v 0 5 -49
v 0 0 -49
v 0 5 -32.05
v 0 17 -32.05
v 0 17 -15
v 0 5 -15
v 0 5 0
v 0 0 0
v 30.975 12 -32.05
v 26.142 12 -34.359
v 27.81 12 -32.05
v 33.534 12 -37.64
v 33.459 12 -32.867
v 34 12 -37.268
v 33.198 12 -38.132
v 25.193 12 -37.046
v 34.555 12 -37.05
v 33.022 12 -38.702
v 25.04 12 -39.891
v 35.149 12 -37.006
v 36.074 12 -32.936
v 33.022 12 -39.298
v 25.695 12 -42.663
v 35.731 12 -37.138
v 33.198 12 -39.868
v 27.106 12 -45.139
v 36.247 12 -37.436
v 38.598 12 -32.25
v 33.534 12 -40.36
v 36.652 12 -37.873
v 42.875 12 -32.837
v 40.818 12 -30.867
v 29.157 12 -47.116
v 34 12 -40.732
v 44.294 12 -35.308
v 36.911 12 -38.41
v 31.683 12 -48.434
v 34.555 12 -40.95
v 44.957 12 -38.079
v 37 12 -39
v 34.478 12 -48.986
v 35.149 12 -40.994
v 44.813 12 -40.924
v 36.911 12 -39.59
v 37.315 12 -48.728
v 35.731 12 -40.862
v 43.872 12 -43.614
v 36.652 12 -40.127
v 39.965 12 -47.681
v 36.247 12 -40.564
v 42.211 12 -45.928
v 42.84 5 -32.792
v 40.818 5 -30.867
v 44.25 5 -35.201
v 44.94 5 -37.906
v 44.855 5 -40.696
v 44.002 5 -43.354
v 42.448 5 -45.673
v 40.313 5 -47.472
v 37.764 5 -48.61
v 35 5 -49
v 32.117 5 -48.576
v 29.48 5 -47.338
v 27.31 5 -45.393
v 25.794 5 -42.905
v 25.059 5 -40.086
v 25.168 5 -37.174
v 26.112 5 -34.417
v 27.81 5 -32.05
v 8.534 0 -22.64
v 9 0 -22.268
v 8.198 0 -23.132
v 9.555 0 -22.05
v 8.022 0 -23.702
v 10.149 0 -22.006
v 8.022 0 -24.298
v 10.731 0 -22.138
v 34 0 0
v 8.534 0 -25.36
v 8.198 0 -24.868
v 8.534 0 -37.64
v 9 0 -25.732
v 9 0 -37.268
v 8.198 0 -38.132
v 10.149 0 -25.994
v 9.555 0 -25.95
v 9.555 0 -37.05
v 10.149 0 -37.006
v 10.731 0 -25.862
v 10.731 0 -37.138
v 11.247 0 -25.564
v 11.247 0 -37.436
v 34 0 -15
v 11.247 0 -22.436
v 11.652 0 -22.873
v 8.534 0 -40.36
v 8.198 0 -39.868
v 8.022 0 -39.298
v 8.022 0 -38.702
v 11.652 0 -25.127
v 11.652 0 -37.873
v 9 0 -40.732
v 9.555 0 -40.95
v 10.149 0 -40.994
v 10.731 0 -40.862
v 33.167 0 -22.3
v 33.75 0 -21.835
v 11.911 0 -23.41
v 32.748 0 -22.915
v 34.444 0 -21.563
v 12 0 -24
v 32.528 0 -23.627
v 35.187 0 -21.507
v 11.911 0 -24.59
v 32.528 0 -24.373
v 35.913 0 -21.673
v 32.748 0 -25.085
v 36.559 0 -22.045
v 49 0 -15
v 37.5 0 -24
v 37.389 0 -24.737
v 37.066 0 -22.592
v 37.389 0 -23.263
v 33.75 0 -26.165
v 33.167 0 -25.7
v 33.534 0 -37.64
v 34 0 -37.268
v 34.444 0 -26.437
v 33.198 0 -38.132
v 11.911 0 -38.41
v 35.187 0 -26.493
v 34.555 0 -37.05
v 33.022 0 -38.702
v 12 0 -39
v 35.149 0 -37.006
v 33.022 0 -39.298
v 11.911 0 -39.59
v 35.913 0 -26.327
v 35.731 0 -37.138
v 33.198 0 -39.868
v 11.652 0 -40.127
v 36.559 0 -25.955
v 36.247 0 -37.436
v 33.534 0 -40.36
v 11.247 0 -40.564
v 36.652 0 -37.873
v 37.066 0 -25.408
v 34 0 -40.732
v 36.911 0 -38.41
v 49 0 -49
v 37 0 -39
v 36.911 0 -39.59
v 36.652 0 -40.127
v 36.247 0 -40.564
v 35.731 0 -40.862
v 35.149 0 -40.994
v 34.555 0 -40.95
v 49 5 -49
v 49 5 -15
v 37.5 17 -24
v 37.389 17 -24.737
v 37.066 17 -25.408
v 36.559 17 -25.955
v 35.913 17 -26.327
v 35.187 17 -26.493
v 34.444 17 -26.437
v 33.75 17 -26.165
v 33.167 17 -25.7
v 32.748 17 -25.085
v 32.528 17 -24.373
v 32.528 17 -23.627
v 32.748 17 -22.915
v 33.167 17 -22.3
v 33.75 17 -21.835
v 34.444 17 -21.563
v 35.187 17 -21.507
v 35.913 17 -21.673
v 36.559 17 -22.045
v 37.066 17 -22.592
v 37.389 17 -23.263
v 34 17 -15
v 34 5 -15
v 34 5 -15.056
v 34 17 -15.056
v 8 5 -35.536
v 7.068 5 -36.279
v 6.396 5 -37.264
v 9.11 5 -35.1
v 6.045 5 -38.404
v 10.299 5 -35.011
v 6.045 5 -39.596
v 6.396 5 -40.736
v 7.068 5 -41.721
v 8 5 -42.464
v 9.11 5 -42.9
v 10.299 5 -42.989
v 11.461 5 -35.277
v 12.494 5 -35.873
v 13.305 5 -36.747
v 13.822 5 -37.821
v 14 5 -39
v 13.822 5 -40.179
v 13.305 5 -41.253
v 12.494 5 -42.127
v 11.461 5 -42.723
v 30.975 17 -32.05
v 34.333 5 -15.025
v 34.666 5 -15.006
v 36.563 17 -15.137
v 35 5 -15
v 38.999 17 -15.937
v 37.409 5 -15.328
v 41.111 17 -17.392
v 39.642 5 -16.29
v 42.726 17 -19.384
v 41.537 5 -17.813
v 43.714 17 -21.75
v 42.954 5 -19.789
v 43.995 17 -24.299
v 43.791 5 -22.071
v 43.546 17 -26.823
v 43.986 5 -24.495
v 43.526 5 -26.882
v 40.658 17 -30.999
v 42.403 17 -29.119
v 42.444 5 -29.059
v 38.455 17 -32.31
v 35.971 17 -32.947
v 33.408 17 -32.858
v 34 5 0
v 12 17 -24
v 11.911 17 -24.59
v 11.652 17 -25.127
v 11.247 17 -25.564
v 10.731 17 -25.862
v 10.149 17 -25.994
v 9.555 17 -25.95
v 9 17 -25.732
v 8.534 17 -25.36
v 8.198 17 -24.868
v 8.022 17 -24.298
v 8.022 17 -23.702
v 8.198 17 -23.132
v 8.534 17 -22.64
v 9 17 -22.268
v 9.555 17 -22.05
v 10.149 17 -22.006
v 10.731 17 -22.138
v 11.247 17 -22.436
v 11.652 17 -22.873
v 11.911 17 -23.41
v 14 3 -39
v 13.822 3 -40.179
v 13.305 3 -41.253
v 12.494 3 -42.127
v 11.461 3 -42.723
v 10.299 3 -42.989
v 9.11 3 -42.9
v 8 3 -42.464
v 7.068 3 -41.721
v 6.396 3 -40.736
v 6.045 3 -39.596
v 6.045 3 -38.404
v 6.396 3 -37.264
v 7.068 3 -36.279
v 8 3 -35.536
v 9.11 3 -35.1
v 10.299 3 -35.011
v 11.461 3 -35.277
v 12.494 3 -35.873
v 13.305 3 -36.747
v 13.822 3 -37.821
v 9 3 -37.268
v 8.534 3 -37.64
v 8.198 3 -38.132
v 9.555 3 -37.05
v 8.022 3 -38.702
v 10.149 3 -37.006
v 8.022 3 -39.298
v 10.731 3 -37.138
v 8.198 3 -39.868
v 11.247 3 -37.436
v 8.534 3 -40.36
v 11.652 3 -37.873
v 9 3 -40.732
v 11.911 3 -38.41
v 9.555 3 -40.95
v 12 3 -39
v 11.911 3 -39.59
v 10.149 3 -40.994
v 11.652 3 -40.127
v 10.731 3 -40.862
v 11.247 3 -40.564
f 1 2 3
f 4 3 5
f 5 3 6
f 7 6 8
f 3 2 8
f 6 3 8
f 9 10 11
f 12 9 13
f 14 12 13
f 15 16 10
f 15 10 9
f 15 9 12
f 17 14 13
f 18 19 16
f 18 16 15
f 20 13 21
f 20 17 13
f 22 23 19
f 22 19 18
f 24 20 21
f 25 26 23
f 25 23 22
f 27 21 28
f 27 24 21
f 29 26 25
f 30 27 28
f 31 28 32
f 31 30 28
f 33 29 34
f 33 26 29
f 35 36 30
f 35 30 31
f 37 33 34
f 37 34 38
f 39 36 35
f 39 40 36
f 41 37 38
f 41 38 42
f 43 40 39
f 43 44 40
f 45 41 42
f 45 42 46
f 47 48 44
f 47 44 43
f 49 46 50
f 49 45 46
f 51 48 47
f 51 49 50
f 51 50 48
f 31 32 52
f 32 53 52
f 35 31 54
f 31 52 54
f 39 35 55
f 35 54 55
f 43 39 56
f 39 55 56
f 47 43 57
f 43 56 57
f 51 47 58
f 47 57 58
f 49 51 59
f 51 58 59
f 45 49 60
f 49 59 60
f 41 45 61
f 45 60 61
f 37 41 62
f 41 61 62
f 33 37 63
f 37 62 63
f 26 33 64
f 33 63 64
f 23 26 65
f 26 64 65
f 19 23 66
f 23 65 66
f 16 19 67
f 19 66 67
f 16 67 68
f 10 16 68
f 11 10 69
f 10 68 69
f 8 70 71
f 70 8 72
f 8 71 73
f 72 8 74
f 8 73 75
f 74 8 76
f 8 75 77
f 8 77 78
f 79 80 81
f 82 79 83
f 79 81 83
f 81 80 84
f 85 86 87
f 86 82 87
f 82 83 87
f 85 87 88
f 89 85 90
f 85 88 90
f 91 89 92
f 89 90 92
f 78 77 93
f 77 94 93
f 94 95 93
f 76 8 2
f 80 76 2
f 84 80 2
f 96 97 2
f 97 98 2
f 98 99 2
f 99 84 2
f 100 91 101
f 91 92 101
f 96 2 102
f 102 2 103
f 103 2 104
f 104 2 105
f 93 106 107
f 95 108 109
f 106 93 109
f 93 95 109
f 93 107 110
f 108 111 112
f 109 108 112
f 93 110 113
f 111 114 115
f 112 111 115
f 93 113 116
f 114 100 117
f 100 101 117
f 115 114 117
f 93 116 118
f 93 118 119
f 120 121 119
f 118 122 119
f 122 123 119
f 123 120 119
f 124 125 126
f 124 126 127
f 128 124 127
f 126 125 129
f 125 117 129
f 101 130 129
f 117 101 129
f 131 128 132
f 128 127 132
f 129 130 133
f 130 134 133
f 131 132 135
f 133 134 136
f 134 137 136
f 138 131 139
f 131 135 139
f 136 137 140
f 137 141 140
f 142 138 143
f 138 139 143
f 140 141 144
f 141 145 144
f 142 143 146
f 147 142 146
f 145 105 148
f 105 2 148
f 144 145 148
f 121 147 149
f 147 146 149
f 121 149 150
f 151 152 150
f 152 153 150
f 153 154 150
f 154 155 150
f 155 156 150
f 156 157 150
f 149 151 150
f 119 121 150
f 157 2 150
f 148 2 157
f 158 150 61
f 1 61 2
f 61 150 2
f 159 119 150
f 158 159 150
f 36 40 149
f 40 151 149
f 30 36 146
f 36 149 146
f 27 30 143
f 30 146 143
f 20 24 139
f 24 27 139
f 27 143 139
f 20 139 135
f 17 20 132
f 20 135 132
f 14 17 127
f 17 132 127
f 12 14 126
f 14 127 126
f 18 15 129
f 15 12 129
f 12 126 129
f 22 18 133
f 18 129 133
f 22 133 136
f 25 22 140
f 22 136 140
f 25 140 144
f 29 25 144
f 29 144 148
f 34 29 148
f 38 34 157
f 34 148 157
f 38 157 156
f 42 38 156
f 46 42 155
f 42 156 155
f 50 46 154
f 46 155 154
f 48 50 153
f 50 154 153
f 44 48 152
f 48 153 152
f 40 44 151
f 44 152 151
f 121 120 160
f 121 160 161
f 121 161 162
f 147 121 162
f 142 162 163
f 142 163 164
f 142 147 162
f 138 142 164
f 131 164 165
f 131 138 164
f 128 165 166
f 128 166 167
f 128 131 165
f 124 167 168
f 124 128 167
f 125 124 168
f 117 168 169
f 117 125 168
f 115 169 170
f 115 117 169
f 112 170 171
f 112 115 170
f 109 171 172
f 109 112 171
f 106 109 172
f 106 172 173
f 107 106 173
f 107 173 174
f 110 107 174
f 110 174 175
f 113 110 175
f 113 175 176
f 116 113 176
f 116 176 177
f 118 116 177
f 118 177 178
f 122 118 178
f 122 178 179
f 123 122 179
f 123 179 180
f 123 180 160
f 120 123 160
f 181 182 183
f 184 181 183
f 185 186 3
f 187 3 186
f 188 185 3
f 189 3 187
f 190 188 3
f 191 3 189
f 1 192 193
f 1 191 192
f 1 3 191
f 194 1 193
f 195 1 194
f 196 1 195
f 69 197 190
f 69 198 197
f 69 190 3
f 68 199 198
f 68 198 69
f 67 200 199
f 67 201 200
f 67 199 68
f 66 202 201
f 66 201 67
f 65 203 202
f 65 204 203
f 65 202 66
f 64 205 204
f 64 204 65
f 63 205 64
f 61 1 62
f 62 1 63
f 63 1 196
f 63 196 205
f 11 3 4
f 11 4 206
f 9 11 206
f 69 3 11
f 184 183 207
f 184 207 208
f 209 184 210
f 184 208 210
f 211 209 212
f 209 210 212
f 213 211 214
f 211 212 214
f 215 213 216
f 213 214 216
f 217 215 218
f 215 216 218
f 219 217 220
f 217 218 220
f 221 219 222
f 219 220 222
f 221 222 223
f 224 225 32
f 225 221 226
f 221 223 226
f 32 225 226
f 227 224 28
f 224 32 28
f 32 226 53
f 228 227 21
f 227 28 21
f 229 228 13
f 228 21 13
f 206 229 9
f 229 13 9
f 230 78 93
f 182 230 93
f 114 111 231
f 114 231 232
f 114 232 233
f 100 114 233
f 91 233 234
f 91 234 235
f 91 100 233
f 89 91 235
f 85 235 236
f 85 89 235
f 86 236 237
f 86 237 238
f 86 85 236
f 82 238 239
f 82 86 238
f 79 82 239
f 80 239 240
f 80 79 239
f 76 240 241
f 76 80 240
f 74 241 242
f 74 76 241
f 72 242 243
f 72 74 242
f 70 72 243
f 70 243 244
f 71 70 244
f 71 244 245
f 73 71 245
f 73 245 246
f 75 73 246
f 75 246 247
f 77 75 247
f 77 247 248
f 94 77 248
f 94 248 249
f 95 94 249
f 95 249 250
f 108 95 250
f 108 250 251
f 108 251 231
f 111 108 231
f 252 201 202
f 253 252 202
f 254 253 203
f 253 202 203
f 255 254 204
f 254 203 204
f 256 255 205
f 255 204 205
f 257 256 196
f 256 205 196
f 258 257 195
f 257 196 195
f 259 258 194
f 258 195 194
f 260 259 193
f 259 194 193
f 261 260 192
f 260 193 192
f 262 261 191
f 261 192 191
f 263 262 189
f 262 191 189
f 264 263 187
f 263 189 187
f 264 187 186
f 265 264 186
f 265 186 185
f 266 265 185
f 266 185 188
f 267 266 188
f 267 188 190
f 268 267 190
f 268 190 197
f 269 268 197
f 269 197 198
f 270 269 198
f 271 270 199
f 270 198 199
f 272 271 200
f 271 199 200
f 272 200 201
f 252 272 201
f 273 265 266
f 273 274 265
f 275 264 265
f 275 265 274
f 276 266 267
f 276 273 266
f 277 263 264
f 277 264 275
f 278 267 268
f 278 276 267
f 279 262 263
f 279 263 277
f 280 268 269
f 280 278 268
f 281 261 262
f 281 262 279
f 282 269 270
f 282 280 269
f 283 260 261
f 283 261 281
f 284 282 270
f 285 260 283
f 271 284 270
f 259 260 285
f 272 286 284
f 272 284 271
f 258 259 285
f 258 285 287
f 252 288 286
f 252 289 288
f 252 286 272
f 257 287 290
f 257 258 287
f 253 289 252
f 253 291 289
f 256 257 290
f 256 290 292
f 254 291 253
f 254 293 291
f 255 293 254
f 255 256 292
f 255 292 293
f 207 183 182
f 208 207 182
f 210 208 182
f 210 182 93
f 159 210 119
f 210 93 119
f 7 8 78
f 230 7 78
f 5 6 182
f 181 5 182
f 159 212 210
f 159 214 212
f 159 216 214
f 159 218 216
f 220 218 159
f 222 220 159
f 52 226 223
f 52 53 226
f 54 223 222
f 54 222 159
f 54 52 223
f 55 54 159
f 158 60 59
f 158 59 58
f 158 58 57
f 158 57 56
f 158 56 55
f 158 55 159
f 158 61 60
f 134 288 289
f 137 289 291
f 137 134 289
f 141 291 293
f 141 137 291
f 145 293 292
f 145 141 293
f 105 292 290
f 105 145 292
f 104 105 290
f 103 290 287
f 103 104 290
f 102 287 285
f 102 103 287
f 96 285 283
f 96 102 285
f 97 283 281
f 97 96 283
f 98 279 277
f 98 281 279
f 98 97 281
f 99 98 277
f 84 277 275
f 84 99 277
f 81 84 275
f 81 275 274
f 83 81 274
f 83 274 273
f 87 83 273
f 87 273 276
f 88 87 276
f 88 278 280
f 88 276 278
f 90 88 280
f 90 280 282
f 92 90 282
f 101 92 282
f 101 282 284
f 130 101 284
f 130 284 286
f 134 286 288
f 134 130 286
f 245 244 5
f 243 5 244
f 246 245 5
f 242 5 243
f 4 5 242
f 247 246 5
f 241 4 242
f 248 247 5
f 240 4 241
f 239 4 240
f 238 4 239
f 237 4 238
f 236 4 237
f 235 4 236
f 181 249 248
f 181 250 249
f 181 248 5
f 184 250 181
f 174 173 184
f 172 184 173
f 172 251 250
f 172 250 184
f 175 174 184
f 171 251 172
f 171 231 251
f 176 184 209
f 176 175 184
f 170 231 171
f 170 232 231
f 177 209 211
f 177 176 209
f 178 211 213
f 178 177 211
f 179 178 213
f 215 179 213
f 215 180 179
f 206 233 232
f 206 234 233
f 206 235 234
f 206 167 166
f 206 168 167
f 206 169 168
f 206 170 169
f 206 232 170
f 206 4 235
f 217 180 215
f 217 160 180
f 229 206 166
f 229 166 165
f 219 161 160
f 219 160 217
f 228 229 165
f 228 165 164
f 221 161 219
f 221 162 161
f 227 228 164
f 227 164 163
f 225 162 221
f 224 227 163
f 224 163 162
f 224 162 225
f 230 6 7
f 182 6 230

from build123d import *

# Parameters (mm, degrees)
SKETCH1_R           = 2
SKETCH1_R_2         = 2.5
BOSS_EXTRUDE1_DEPTH = 5
SKETCH2_R           = 4
CUT_EXTRUDE1_DEPTH  = 2
SKETCH3_R           = 10
BOSS_EXTRUDE2_DEPTH = 12
SKETCH4_R           = 2
CUT_EXTRUDE2_DEPTH  = 12
SKETCH5_R           = 10
SKETCH5_R_2         = 2
CUT_EXTRUDE3_DEPTH  = 5
SKETCH6_R           = 9
SKETCH6_R_2         = 2.5
BOSS_EXTRUDE3_DEPTH = 12
SKETCH7_R           = 2.299679875
SKETCH7_W           = 34
SKETCH7_H           = 17.049766734
SKETCH7_R_2         = 2
BOSS_EXTRUDE4_DEPTH = 12
SKETCH9_R           = 2.5
CUT_EXTRUDE5_DEPTH  = 27


with BuildPart() as part:
    # Sketch1 → Boss-Extrude1 (new body)
    with BuildSketch(Plane(origin=(0, 0, 0), x_dir=(1, 0, 0), z_dir=(0, 1, 0))):
        Polygon((0, 49), (0, 0), (34, 0), (34, 15), (49, 15), (49, 49), align=None)
        with Locations((10, 24)):
            Circle(SKETCH1_R, mode=Mode.SUBTRACT)
        with Locations((35, 24)):
            Circle(SKETCH1_R_2, mode=Mode.SUBTRACT)
        with Locations((10, 39)):
            Circle(SKETCH1_R, mode=Mode.SUBTRACT)
        with Locations((35, 39)):
            Circle(SKETCH1_R, mode=Mode.SUBTRACT)
    extrude(amount=BOSS_EXTRUDE1_DEPTH)

    # Sketch2 → Cut-Extrude1 (cut)
    with BuildSketch(Plane(origin=(0, 5, 0), x_dir=(1, 0, 0), z_dir=(0, 1, 0))):
        with Locations((10, 39)):
            Circle(SKETCH2_R)
    extrude(amount=-CUT_EXTRUDE1_DEPTH, mode=Mode.SUBTRACT)

    # Sketch3 → Boss-Extrude2 (add)
    with BuildSketch(Plane(origin=(0, 5, 0), x_dir=(1, 0, 0), z_dir=(0, 1, 0))):
        with Locations((35, 39)):
            Circle(SKETCH3_R)
    extrude(amount=BOSS_EXTRUDE2_DEPTH)

    # Sketch4 → Cut-Extrude2 (cut)
    with BuildSketch(Plane.XZ.offset(-5)):
        with Locations((35, -39)):
            Circle(SKETCH4_R)
    extrude(amount=-CUT_EXTRUDE2_DEPTH, mode=Mode.SUBTRACT)

    # Sketch5 → Cut-Extrude3 (cut)
    with BuildSketch(Plane(origin=(0, 17, 0), x_dir=(1, 0, 0), z_dir=(0, 1, 0))):
        with Locations((35, 39)):
            Circle(SKETCH5_R)
        with Locations((35, 39)):
            Circle(SKETCH5_R_2, mode=Mode.SUBTRACT)
    extrude(amount=-CUT_EXTRUDE3_DEPTH, mode=Mode.SUBTRACT)

    # Sketch6 → Boss-Extrude3 (add)
    with BuildSketch(Plane(origin=(0, 5, 0), x_dir=(1, 0, 0), z_dir=(0, 1, 0))):
        with Locations((35, 24)):
            Circle(SKETCH6_R)
        with Locations((35, 24)):
            Circle(SKETCH6_R_2, mode=Mode.SUBTRACT)
    extrude(amount=BOSS_EXTRUDE3_DEPTH)

    # Sketch7 → Boss-Extrude4 (add)
    with BuildSketch(Plane(origin=(0, 5, 0), x_dir=(1, 0, 0), z_dir=(0, 1, 0))):
        with Locations((35, 24)):
            Circle(SKETCH7_R)
        with Locations((17, 23.524883367)):
            Rectangle(SKETCH7_W, SKETCH7_H)
        with Locations((10, 24)):
            Circle(SKETCH7_R_2, mode=Mode.SUBTRACT)
    extrude(amount=BOSS_EXTRUDE4_DEPTH)

    # Sketch9 → Cut-Extrude5 (cut)
    with BuildSketch(Plane(origin=(0, 17, 0), x_dir=(1, 0, 0), z_dir=(0, 1, 0))):
        with Locations((35, 24)):
            Circle(SKETCH9_R)
    extrude(amount=-CUT_EXTRUDE5_DEPTH, mode=Mode.SUBTRACT)


solid = part.part
